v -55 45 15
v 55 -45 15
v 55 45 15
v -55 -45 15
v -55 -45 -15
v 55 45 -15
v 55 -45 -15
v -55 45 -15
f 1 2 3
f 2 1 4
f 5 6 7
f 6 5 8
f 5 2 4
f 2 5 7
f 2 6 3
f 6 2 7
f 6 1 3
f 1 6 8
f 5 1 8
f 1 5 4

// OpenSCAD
/* [Box dimensions] */
// - Longueur - Length  
  Length        = 110;       
// - Largeur - Width
  Width         = 90;                     
// - Hauteur - Height  
  Height        = 30;  
// - Epaisseur - Wall thickness  
  Thick         = 2;//[2:5]  
  
  cube([Length,Width,Height],center=true);
